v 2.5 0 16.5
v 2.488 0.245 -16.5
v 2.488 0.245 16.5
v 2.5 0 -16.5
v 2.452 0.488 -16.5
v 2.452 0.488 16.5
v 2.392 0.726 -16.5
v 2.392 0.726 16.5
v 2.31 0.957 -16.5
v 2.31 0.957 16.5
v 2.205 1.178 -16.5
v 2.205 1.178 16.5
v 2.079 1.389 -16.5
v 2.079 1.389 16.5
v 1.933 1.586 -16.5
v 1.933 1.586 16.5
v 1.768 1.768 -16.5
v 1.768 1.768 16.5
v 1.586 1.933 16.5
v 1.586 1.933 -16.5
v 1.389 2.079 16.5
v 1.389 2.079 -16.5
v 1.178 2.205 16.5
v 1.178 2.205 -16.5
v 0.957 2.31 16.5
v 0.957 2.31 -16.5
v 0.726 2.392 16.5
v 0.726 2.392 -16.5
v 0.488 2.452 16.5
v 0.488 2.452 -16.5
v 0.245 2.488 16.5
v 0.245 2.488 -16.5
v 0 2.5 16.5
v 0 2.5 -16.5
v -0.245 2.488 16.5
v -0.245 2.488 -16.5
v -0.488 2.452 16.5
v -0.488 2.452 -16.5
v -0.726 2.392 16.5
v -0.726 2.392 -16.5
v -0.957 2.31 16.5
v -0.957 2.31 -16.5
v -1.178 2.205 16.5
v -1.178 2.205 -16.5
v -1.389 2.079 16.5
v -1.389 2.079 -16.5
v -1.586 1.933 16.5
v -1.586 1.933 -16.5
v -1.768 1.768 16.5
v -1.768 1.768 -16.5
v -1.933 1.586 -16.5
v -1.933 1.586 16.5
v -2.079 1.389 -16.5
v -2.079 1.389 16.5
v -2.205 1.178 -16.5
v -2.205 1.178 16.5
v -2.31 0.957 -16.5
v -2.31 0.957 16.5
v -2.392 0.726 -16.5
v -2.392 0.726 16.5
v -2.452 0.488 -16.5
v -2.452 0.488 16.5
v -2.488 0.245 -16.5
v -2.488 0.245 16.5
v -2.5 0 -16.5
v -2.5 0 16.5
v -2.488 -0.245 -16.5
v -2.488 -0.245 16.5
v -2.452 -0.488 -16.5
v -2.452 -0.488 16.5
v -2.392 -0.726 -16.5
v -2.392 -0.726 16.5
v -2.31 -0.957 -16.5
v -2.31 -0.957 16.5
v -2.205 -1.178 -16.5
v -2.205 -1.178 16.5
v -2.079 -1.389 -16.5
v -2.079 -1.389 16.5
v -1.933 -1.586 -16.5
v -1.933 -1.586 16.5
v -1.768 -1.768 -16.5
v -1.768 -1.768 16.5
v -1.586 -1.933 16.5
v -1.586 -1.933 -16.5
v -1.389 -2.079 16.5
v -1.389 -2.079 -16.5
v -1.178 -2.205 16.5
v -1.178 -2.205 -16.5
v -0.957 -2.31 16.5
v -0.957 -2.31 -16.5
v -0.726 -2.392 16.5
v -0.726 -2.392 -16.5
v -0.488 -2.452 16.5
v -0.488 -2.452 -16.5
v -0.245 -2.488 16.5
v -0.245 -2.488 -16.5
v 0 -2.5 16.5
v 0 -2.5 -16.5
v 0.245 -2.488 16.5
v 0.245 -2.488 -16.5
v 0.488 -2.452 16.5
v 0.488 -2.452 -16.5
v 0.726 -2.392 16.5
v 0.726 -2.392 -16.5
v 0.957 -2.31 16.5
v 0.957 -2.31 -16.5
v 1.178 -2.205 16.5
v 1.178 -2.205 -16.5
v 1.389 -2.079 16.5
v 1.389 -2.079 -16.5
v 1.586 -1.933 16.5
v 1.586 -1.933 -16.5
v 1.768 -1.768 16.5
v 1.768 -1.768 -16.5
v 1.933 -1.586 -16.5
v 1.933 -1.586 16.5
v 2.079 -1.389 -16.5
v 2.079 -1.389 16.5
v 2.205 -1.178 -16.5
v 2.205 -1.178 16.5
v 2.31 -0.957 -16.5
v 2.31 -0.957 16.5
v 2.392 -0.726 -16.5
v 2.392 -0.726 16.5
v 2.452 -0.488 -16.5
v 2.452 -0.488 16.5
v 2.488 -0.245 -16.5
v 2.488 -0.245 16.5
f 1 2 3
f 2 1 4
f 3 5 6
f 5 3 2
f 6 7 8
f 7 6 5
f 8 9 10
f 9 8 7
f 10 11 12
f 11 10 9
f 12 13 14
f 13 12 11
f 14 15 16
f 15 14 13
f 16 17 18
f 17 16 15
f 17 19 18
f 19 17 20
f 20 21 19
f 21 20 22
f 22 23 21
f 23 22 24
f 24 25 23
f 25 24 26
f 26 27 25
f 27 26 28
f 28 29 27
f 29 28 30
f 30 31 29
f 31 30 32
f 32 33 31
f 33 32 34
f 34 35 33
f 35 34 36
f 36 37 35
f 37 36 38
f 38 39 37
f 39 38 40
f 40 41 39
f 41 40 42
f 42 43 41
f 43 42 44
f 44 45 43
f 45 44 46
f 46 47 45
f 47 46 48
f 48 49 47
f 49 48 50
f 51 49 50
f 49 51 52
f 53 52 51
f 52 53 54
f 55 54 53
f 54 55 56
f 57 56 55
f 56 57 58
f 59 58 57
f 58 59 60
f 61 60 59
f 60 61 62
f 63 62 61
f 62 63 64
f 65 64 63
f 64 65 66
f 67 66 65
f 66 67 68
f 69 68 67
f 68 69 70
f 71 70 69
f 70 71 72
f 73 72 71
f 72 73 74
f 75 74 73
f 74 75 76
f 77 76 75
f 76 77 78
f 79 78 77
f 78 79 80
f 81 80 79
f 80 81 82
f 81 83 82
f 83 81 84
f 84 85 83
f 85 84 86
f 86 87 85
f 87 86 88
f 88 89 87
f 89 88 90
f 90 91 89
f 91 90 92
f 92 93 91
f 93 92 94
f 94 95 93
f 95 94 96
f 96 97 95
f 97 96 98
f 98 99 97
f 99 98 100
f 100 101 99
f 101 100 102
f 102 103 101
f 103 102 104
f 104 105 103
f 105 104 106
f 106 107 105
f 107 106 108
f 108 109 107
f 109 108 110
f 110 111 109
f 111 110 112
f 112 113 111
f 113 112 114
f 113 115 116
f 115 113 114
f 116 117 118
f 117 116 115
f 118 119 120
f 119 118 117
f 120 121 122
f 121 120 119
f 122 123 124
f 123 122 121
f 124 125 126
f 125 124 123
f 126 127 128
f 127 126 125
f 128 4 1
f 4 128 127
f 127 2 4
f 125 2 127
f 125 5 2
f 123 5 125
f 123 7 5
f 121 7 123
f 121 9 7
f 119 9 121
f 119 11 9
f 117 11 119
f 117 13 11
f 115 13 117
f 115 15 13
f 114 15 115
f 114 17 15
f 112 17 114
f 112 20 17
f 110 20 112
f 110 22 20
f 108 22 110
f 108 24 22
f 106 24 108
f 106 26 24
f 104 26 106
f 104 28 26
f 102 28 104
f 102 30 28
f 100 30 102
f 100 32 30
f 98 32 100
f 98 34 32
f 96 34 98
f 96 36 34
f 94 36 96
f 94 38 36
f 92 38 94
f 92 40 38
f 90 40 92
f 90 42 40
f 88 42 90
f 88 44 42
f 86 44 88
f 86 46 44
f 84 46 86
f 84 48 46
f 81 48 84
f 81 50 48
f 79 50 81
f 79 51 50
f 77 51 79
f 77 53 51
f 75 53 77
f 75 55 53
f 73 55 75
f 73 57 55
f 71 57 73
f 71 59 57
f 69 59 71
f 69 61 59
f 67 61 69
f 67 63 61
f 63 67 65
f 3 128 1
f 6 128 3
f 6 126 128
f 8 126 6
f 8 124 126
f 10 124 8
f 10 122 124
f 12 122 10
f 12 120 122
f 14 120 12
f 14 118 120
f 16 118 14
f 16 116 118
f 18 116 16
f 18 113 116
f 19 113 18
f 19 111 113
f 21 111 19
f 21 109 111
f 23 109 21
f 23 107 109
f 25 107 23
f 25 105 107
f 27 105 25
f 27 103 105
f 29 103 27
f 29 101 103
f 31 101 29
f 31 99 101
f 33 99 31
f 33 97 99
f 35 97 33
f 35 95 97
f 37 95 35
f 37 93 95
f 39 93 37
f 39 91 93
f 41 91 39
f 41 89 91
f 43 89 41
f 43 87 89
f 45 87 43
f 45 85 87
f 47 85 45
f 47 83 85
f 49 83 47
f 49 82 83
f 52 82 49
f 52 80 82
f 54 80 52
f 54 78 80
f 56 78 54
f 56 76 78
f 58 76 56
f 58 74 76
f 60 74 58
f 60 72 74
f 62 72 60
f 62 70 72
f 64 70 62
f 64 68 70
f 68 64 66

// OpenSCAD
$fn = 64;
length = 33;
dia = 5.0;

cylinder(h=length, r=dia/2, center=true);
